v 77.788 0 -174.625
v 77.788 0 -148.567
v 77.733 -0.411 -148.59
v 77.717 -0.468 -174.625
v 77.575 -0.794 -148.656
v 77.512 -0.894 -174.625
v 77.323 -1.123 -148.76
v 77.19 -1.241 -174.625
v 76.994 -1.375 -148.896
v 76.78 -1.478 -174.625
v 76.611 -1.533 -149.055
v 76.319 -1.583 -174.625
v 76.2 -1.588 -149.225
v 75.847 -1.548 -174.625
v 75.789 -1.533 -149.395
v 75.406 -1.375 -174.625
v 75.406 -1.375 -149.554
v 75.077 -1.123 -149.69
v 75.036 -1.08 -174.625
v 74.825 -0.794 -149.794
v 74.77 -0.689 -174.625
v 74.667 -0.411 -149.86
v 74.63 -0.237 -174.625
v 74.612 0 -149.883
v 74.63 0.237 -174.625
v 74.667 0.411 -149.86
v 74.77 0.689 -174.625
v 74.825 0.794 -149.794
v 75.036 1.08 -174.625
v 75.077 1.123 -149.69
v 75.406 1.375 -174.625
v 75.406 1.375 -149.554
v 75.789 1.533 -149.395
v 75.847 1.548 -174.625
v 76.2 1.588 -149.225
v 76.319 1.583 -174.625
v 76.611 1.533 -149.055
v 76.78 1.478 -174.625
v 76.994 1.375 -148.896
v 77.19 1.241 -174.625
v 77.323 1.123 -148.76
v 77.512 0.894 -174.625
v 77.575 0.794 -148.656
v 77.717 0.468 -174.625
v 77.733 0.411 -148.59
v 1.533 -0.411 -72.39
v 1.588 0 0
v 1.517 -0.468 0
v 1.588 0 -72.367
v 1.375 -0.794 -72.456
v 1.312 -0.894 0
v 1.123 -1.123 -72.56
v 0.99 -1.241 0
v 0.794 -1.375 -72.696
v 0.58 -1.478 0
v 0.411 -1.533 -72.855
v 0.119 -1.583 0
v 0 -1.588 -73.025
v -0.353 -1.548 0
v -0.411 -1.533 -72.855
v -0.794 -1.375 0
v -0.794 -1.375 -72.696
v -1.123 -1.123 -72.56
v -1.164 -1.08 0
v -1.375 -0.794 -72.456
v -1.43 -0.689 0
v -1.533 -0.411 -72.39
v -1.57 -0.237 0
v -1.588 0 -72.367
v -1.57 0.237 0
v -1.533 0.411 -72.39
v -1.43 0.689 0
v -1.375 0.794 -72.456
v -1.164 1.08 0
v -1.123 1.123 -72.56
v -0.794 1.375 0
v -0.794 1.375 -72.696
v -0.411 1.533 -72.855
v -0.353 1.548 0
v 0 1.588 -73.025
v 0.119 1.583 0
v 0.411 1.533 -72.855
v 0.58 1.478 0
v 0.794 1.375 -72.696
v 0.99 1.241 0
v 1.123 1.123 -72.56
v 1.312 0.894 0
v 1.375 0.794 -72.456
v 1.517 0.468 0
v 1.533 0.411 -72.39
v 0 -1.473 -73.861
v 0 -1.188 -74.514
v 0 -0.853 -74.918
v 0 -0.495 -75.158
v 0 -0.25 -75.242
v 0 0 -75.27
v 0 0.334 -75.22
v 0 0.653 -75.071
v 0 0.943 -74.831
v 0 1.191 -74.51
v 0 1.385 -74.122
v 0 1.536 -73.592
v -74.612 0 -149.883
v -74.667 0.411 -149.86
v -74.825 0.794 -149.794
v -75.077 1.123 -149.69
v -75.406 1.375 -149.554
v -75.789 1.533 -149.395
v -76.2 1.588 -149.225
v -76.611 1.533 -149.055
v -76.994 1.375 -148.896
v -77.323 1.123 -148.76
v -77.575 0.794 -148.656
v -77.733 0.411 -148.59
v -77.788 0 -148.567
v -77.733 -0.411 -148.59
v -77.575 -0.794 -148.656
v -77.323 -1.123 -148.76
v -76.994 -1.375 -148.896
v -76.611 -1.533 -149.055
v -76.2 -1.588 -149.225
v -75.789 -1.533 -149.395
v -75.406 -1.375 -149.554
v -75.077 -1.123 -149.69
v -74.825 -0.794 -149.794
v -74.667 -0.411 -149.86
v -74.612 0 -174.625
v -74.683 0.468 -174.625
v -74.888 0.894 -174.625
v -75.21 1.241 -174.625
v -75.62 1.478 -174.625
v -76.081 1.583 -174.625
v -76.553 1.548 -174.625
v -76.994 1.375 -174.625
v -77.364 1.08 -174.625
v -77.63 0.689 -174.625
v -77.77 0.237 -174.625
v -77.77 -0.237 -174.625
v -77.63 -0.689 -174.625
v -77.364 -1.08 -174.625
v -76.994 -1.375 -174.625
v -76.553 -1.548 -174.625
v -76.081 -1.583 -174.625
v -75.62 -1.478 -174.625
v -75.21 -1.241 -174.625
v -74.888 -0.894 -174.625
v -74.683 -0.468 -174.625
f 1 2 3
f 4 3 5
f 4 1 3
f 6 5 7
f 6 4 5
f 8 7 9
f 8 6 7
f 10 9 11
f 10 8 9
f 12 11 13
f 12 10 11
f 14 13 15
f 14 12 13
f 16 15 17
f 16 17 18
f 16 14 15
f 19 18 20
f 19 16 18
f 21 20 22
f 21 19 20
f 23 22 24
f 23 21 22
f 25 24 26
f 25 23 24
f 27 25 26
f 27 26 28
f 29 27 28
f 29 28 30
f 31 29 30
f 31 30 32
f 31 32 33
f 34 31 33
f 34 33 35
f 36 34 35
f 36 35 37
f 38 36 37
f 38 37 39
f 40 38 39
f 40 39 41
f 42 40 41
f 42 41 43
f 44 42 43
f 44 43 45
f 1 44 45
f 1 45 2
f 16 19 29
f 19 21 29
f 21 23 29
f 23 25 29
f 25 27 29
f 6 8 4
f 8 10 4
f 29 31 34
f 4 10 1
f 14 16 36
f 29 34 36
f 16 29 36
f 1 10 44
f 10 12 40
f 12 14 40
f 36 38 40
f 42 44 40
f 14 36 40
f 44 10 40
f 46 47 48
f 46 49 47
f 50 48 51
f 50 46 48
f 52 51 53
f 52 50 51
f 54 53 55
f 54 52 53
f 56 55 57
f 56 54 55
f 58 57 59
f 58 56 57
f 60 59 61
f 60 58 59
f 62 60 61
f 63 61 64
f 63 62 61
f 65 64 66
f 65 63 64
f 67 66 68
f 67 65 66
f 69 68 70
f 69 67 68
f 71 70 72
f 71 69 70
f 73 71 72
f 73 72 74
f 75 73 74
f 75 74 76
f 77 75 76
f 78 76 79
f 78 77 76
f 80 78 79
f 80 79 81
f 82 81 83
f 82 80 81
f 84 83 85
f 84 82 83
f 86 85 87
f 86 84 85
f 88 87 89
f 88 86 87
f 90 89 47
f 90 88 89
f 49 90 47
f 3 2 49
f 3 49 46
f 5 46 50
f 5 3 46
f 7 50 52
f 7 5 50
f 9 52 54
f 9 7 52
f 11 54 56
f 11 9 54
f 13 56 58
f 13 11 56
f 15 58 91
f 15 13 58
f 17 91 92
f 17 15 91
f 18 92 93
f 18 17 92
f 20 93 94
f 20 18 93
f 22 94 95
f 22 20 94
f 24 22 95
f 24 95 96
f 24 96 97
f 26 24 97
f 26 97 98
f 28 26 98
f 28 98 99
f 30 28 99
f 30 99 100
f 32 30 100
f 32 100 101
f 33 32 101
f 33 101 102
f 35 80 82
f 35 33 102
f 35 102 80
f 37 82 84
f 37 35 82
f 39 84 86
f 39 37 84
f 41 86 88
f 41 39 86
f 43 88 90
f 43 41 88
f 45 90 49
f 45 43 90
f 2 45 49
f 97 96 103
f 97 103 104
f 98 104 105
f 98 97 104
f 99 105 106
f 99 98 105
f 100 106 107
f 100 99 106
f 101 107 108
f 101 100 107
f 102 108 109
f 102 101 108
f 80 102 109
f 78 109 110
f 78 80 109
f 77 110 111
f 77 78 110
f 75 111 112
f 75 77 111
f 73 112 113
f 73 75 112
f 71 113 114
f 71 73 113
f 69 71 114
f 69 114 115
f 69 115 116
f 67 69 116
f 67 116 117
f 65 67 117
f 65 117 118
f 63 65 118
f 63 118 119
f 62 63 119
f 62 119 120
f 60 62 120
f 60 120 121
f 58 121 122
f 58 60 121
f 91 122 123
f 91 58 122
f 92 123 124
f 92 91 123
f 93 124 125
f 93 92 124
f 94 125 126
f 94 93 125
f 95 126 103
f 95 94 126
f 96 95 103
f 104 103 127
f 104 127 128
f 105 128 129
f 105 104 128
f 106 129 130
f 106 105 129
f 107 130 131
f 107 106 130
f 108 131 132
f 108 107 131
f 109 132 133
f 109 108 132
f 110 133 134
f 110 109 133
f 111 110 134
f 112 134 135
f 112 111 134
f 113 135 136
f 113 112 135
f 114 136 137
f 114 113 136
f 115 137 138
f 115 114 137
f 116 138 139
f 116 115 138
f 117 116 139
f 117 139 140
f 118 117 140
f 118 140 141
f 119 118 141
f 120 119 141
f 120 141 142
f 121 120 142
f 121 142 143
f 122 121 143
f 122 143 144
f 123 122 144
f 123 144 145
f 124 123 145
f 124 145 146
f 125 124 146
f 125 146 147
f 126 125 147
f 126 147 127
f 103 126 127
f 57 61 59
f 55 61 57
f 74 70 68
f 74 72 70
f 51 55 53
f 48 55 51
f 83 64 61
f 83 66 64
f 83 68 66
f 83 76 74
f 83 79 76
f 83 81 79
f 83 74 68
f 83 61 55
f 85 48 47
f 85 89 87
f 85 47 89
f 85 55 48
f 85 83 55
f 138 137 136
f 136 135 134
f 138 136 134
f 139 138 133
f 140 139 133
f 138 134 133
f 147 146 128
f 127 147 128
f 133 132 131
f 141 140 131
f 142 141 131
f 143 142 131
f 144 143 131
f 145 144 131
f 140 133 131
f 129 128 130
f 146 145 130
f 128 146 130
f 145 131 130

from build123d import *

# Parameters (mm, degrees)
SKETCH2_R = 1.5875
SKETCH3_R = 1.5875


with BuildPart() as part:
    # Sweep1: sweep along a path in Sketch1
    with BuildLine(Plane(origin=(0, 0, 0), x_dir=(1, 0, 0), z_dir=(0, 1, 0))) as sweep1_path:
        Line((0, 0), (0, 73.025))
        Line((0, 73.025), (76.2, 149.225))
        Line((76.2, 149.225), (76.2, 174.625))
    # Sketch2 → Sweep1 (sweep)
    with BuildSketch(Plane.XY):
        Circle(SKETCH2_R)
    sweep(path=sweep1_path.line, transition=Transition.RIGHT)

    # Sweep4: sweep along a path in Sketch4
    with BuildLine(Plane(origin=(0, 0, 0), x_dir=(1, 0, 0), z_dir=(0, 1, 0))) as sweep4_path:
        Line((-76.2, 174.625), (-76.2, 149.225))
        Line((-76.2, 149.225), (0, 73.025))
    # Sketch3 → Sweep4 (sweep)
    with BuildSketch(Plane(origin=(-76.2, 0, -174.625), x_dir=(1, 0, 0), z_dir=(0, 0, 1))):
        Circle(SKETCH3_R)
    sweep(path=sweep4_path.line, transition=Transition.RIGHT)


solid = part.part
